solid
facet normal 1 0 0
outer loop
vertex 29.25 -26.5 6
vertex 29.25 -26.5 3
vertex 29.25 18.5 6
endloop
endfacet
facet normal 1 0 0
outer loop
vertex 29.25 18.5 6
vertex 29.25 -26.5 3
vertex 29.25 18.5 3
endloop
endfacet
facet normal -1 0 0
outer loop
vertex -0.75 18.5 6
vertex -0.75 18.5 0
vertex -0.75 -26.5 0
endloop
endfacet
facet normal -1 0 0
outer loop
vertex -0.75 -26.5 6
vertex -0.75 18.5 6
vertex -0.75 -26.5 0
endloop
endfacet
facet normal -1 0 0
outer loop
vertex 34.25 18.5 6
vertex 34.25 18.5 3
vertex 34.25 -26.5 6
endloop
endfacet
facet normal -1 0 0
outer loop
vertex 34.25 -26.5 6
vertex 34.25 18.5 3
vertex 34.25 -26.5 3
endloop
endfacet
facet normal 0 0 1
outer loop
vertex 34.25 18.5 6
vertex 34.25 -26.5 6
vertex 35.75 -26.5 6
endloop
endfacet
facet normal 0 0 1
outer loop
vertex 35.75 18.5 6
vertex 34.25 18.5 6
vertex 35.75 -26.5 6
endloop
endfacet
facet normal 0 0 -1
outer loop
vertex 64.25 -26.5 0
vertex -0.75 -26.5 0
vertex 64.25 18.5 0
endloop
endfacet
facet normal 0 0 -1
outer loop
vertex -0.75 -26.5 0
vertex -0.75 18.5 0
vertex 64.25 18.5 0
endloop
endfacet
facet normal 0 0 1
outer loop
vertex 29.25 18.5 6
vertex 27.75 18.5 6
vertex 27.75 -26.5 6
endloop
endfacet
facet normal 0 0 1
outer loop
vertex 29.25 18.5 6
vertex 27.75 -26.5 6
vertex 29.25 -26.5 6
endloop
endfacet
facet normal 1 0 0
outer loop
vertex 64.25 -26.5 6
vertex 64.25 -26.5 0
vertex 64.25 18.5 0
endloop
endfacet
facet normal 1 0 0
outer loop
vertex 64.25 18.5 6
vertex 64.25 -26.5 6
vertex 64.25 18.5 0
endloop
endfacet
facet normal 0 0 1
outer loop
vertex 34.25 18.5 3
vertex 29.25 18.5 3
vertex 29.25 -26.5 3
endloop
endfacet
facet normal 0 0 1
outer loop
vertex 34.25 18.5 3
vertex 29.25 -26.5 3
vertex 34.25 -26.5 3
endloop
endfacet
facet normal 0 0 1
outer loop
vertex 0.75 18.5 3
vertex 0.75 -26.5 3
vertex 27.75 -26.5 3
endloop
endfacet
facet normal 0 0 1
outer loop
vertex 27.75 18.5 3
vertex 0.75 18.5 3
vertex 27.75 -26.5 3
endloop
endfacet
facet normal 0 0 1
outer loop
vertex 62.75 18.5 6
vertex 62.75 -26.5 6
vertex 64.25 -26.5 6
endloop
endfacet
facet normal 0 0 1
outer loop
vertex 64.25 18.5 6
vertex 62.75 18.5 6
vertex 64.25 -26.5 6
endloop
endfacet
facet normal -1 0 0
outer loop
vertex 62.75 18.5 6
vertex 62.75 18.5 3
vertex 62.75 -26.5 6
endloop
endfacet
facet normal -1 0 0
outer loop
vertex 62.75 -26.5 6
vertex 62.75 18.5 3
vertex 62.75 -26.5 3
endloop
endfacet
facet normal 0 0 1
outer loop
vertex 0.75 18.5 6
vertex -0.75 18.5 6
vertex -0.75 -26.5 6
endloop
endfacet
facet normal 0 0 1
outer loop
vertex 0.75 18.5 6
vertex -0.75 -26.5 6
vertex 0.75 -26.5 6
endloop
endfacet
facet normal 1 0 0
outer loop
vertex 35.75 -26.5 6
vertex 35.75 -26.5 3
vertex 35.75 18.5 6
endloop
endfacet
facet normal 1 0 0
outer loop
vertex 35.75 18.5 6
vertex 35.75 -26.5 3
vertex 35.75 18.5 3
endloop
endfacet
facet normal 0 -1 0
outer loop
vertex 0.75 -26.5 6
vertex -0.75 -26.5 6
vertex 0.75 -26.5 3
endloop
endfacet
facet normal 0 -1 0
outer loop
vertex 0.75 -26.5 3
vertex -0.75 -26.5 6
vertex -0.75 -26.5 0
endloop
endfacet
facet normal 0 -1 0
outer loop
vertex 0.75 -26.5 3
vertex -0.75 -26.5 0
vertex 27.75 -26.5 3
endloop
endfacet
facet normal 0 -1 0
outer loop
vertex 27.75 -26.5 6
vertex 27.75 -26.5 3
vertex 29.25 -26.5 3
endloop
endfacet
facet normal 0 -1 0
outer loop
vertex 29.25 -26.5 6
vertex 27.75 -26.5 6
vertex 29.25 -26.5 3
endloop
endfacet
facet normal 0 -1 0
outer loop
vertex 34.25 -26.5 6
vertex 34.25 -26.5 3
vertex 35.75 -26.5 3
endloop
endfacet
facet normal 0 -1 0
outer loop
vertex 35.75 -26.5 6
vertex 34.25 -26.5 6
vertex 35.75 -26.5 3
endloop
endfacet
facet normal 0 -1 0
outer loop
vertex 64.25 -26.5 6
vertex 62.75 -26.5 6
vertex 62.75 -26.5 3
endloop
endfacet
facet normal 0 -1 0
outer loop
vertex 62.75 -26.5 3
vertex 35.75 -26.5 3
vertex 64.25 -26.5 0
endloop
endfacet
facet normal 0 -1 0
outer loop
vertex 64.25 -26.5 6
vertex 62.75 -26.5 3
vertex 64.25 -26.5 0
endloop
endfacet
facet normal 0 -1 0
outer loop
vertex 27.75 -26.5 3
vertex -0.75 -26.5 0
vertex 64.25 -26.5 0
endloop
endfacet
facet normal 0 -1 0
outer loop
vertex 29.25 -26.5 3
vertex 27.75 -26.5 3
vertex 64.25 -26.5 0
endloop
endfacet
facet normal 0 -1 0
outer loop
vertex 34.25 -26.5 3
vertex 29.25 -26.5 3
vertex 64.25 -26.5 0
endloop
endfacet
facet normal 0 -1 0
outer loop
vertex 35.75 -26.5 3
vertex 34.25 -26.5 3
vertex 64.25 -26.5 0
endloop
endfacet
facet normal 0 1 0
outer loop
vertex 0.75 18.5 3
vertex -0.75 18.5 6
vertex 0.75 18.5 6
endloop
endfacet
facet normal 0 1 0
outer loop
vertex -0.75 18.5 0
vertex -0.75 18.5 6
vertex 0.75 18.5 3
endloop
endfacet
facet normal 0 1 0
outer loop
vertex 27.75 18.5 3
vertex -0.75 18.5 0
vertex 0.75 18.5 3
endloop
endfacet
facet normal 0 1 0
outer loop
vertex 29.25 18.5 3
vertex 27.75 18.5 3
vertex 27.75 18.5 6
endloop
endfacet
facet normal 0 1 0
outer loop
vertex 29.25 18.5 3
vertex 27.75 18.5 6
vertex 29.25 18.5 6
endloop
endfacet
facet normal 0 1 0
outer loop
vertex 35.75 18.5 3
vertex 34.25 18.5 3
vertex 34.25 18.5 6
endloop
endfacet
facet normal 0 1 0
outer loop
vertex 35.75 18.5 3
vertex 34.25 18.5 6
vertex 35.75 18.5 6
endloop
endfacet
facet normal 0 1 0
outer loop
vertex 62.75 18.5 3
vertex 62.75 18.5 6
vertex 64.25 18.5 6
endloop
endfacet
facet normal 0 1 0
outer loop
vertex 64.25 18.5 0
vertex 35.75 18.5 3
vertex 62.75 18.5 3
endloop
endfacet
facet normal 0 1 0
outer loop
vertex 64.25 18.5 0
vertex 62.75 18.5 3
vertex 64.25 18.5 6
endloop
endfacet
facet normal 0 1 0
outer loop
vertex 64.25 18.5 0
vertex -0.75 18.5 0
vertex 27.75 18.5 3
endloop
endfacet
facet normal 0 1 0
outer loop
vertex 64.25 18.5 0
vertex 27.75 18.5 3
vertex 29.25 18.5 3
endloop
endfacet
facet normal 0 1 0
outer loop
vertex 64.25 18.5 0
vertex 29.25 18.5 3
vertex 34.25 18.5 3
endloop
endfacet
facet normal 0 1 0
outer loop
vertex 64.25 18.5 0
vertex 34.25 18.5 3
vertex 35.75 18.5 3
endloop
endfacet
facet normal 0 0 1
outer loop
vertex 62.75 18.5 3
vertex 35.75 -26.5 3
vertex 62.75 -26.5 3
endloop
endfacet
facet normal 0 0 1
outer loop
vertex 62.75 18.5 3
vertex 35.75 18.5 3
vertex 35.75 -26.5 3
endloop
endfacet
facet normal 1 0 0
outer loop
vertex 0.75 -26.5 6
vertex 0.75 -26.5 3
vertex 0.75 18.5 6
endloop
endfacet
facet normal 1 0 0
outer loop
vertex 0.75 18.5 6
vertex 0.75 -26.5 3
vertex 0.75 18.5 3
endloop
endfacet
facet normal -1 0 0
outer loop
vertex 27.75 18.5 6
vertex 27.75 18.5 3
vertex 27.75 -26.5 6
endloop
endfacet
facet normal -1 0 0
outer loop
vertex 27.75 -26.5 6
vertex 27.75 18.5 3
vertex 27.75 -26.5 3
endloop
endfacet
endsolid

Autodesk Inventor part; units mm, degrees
ref_plane "YZ Plane" through (0, 0, 0) normal (1, 0, 0) x (0, 1, 0)
ref_plane "XZ Plane" through (0, 0, 0) normal (0, 1, 0) x (-1, 0, 0)
ref_plane "XY Plane" through (0, 0, 0) normal (0, 0, 1) x (1, 0, 0)
sketch "Sketch1" plane through (0, 0, 0) normal (0, 0, 1) x (1, 0, 0)
  line L0 (0.75, -26.5) -> (0.75, 26.5) projected
  line L1 (0.75, 26.5) -> (-0.75, 26.5) projected
  line L2 (-0.75, 26.5) -> (-0.75, -26.5) projected
  line L3 (-0.75, -26.5) -> (0.75, -26.5) projected
  line L4 (27.75, 26.5) -> (27.75, -26.5) projected
  line L5 (27.75, -26.5) -> (29.25, -26.5) projected
  line L6 (29.25, -26.5) -> (29.25, 26.5) projected
  line L7 (29.25, 26.5) -> (27.75, 26.5) projected
  line L8 (35.75, -26.5) -> (35.75, 26.5) projected
  line L9 (35.75, 26.5) -> (34.25, 26.5) projected
  line L10 (34.25, 26.5) -> (34.25, -26.5) projected
  line L11 (34.25, -26.5) -> (35.75, -26.5) projected
  line L12 (64.25, -26.5) -> (64.25, 26.5) projected
  line L13 (62.75, 26.5) -> (62.75, -26.5) projected
  line L14 (62.75, -26.5) -> (64.25, -26.5) projected
  line L15 (64.25, -26.5) -> (64.25, 26.5) projected
  line L16 (64.25, 26.5) -> (62.75, 26.5) projected
  line L17 (64.25, -26.5) -> (-0.75, -26.5)
  line L18 (-0.75, -26.5) -> (-0.75, 18.5)
  line L19 (-0.75, 18.5) -> (64.25, 18.5)
  line L20 (64.25, 18.5) -> (64.25, -26.5)
  line L21 (62.75, 18.5) -> (62.75, -26.5)
  line L22 (35.75, 18.5) -> (35.75, -26.5)
  line L23 (34.25, 18.5) -> (34.25, -26.5)
  line L24 (29.25, 18.5) -> (29.25, -26.5)
  line L25 (27.75, -26.5) -> (27.75, 18.5)
  line L26 (0.75, 18.5) -> (0.75, -26.5)
  point P0 (0, 0)
  dimension "d0" = 45
extrude "Extrusion1" add sketch "Sketch1" along normal blind 3 contours L3 L2 L19 L0 | L0 L19 L4 L17 | L4 L19 L6 L5 | L6 L19 L10 L17 | L10 L19 L8 L11 | L8 L19 L13 L17 | L13 L19 L12 L14
sketch "Sketch2" plane through (0, 0, 3) normal (0, 0, 1) x (1, 0, 0)
  line L0 (0.75, -26.5) -> (0.75, 26.5)
  line L1 (0.75, 26.5) -> (-0.75, 26.5)
  line L2 (-0.75, 26.5) -> (-0.75, -26.5)
  line L3 (-0.75, -26.5) -> (0.75, -26.5)
  line L4 (27.75, 26.5) -> (27.75, -26.5)
  line L5 (27.75, -26.5) -> (29.25, -26.5)
  line L6 (29.25, -26.5) -> (29.25, 26.5)
  line L7 (29.25, 26.5) -> (27.75, 26.5)
  line L8 (35.75, -26.5) -> (35.75, 26.5)
  line L9 (35.75, 26.5) -> (34.25, 26.5)
  line L10 (34.25, 26.5) -> (34.25, -26.5)
  line L11 (34.25, -26.5) -> (35.75, -26.5)
  line L12 (64.25, -26.5) -> (64.25, 26.5)
  line L13 (62.75, 26.5) -> (62.75, -26.5)
  line L14 (62.75, -26.5) -> (64.25, -26.5)
  line L15 (64.25, -26.5) -> (64.25, 26.5)
  line L16 (64.25, 26.5) -> (62.75, 26.5)
  line L17 (64.25, -26.5) -> (-0.75, -26.5)
  line L18 (-0.75, -26.5) -> (-0.75, 18.5)
  line L19 (-0.75, 18.5) -> (64.25, 18.5)
  line L20 (64.25, 18.5) -> (64.25, -26.5)
  line L21 (62.75, 18.5) -> (62.75, -26.5)
  line L22 (35.75, 18.5) -> (35.75, -26.5)
  line L23 (34.25, 18.5) -> (34.25, -26.5)
  line L24 (29.25, 18.5) -> (29.25, -26.5)
  line L25 (27.75, -26.5) -> (27.75, 18.5)
  line L26 (0.75, 18.5) -> (0.75, -26.5)
  line L27 (0.75, -26.5) -> (0.75, 26.5)
  line L28 (0.75, 26.5) -> (-0.75, 26.5)
  line L29 (-0.75, 26.5) -> (-0.75, -26.5)
  line L30 (-0.75, -26.5) -> (0.75, -26.5)
  line L31 (27.75, 26.5) -> (27.75, -26.5)
  line L32 (27.75, -26.5) -> (29.25, -26.5)
  line L33 (29.25, -26.5) -> (29.25, 26.5)
  line L34 (29.25, 26.5) -> (27.75, 26.5)
  line L35 (35.75, -26.5) -> (35.75, 26.5)
  line L36 (35.75, 26.5) -> (34.25, 26.5)
  line L37 (34.25, 26.5) -> (34.25, -26.5)
  line L38 (34.25, -26.5) -> (35.75, -26.5)
  line L39 (64.25, -26.5) -> (64.25, 26.5)
  line L40 (62.75, 26.5) -> (62.75, -26.5)
  line L41 (62.75, -26.5) -> (64.25, -26.5)
  line L42 (64.25, -26.5) -> (64.25, 26.5)
  line L43 (64.25, 26.5) -> (62.75, 26.5)
  line L44 (64.25, -26.5) -> (-0.75, -26.5)
  line L45 (-0.75, -26.5) -> (-0.75, 18.5)
  line L46 (-0.75, 18.5) -> (64.25, 18.5)
  line L47 (64.25, 18.5) -> (64.25, -26.5)
  line L48 (62.75, 18.5) -> (62.75, -26.5)
  line L49 (35.75, 18.5) -> (35.75, -26.5)
  line L50 (34.25, 18.5) -> (34.25, -26.5)
  line L51 (29.25, 18.5) -> (29.25, -26.5)
  line L52 (27.75, -26.5) -> (27.75, 18.5)
  line L53 (0.75, 18.5) -> (0.75, -26.5)
  point P0 (0, 0)
  point P1 (0, 0)
  point P2 (0, 0)
  dimension "d3" = 45
  dimension "d4" = 45
extrude "Extrusion2" add sketch "Sketch2" along normal blind 3 contours L3 L2 L19 L0 | L4 L19 L6 L5 | L10 L19 L8 L11 | L13 L19 L12 L14
properties part number "base_2"
